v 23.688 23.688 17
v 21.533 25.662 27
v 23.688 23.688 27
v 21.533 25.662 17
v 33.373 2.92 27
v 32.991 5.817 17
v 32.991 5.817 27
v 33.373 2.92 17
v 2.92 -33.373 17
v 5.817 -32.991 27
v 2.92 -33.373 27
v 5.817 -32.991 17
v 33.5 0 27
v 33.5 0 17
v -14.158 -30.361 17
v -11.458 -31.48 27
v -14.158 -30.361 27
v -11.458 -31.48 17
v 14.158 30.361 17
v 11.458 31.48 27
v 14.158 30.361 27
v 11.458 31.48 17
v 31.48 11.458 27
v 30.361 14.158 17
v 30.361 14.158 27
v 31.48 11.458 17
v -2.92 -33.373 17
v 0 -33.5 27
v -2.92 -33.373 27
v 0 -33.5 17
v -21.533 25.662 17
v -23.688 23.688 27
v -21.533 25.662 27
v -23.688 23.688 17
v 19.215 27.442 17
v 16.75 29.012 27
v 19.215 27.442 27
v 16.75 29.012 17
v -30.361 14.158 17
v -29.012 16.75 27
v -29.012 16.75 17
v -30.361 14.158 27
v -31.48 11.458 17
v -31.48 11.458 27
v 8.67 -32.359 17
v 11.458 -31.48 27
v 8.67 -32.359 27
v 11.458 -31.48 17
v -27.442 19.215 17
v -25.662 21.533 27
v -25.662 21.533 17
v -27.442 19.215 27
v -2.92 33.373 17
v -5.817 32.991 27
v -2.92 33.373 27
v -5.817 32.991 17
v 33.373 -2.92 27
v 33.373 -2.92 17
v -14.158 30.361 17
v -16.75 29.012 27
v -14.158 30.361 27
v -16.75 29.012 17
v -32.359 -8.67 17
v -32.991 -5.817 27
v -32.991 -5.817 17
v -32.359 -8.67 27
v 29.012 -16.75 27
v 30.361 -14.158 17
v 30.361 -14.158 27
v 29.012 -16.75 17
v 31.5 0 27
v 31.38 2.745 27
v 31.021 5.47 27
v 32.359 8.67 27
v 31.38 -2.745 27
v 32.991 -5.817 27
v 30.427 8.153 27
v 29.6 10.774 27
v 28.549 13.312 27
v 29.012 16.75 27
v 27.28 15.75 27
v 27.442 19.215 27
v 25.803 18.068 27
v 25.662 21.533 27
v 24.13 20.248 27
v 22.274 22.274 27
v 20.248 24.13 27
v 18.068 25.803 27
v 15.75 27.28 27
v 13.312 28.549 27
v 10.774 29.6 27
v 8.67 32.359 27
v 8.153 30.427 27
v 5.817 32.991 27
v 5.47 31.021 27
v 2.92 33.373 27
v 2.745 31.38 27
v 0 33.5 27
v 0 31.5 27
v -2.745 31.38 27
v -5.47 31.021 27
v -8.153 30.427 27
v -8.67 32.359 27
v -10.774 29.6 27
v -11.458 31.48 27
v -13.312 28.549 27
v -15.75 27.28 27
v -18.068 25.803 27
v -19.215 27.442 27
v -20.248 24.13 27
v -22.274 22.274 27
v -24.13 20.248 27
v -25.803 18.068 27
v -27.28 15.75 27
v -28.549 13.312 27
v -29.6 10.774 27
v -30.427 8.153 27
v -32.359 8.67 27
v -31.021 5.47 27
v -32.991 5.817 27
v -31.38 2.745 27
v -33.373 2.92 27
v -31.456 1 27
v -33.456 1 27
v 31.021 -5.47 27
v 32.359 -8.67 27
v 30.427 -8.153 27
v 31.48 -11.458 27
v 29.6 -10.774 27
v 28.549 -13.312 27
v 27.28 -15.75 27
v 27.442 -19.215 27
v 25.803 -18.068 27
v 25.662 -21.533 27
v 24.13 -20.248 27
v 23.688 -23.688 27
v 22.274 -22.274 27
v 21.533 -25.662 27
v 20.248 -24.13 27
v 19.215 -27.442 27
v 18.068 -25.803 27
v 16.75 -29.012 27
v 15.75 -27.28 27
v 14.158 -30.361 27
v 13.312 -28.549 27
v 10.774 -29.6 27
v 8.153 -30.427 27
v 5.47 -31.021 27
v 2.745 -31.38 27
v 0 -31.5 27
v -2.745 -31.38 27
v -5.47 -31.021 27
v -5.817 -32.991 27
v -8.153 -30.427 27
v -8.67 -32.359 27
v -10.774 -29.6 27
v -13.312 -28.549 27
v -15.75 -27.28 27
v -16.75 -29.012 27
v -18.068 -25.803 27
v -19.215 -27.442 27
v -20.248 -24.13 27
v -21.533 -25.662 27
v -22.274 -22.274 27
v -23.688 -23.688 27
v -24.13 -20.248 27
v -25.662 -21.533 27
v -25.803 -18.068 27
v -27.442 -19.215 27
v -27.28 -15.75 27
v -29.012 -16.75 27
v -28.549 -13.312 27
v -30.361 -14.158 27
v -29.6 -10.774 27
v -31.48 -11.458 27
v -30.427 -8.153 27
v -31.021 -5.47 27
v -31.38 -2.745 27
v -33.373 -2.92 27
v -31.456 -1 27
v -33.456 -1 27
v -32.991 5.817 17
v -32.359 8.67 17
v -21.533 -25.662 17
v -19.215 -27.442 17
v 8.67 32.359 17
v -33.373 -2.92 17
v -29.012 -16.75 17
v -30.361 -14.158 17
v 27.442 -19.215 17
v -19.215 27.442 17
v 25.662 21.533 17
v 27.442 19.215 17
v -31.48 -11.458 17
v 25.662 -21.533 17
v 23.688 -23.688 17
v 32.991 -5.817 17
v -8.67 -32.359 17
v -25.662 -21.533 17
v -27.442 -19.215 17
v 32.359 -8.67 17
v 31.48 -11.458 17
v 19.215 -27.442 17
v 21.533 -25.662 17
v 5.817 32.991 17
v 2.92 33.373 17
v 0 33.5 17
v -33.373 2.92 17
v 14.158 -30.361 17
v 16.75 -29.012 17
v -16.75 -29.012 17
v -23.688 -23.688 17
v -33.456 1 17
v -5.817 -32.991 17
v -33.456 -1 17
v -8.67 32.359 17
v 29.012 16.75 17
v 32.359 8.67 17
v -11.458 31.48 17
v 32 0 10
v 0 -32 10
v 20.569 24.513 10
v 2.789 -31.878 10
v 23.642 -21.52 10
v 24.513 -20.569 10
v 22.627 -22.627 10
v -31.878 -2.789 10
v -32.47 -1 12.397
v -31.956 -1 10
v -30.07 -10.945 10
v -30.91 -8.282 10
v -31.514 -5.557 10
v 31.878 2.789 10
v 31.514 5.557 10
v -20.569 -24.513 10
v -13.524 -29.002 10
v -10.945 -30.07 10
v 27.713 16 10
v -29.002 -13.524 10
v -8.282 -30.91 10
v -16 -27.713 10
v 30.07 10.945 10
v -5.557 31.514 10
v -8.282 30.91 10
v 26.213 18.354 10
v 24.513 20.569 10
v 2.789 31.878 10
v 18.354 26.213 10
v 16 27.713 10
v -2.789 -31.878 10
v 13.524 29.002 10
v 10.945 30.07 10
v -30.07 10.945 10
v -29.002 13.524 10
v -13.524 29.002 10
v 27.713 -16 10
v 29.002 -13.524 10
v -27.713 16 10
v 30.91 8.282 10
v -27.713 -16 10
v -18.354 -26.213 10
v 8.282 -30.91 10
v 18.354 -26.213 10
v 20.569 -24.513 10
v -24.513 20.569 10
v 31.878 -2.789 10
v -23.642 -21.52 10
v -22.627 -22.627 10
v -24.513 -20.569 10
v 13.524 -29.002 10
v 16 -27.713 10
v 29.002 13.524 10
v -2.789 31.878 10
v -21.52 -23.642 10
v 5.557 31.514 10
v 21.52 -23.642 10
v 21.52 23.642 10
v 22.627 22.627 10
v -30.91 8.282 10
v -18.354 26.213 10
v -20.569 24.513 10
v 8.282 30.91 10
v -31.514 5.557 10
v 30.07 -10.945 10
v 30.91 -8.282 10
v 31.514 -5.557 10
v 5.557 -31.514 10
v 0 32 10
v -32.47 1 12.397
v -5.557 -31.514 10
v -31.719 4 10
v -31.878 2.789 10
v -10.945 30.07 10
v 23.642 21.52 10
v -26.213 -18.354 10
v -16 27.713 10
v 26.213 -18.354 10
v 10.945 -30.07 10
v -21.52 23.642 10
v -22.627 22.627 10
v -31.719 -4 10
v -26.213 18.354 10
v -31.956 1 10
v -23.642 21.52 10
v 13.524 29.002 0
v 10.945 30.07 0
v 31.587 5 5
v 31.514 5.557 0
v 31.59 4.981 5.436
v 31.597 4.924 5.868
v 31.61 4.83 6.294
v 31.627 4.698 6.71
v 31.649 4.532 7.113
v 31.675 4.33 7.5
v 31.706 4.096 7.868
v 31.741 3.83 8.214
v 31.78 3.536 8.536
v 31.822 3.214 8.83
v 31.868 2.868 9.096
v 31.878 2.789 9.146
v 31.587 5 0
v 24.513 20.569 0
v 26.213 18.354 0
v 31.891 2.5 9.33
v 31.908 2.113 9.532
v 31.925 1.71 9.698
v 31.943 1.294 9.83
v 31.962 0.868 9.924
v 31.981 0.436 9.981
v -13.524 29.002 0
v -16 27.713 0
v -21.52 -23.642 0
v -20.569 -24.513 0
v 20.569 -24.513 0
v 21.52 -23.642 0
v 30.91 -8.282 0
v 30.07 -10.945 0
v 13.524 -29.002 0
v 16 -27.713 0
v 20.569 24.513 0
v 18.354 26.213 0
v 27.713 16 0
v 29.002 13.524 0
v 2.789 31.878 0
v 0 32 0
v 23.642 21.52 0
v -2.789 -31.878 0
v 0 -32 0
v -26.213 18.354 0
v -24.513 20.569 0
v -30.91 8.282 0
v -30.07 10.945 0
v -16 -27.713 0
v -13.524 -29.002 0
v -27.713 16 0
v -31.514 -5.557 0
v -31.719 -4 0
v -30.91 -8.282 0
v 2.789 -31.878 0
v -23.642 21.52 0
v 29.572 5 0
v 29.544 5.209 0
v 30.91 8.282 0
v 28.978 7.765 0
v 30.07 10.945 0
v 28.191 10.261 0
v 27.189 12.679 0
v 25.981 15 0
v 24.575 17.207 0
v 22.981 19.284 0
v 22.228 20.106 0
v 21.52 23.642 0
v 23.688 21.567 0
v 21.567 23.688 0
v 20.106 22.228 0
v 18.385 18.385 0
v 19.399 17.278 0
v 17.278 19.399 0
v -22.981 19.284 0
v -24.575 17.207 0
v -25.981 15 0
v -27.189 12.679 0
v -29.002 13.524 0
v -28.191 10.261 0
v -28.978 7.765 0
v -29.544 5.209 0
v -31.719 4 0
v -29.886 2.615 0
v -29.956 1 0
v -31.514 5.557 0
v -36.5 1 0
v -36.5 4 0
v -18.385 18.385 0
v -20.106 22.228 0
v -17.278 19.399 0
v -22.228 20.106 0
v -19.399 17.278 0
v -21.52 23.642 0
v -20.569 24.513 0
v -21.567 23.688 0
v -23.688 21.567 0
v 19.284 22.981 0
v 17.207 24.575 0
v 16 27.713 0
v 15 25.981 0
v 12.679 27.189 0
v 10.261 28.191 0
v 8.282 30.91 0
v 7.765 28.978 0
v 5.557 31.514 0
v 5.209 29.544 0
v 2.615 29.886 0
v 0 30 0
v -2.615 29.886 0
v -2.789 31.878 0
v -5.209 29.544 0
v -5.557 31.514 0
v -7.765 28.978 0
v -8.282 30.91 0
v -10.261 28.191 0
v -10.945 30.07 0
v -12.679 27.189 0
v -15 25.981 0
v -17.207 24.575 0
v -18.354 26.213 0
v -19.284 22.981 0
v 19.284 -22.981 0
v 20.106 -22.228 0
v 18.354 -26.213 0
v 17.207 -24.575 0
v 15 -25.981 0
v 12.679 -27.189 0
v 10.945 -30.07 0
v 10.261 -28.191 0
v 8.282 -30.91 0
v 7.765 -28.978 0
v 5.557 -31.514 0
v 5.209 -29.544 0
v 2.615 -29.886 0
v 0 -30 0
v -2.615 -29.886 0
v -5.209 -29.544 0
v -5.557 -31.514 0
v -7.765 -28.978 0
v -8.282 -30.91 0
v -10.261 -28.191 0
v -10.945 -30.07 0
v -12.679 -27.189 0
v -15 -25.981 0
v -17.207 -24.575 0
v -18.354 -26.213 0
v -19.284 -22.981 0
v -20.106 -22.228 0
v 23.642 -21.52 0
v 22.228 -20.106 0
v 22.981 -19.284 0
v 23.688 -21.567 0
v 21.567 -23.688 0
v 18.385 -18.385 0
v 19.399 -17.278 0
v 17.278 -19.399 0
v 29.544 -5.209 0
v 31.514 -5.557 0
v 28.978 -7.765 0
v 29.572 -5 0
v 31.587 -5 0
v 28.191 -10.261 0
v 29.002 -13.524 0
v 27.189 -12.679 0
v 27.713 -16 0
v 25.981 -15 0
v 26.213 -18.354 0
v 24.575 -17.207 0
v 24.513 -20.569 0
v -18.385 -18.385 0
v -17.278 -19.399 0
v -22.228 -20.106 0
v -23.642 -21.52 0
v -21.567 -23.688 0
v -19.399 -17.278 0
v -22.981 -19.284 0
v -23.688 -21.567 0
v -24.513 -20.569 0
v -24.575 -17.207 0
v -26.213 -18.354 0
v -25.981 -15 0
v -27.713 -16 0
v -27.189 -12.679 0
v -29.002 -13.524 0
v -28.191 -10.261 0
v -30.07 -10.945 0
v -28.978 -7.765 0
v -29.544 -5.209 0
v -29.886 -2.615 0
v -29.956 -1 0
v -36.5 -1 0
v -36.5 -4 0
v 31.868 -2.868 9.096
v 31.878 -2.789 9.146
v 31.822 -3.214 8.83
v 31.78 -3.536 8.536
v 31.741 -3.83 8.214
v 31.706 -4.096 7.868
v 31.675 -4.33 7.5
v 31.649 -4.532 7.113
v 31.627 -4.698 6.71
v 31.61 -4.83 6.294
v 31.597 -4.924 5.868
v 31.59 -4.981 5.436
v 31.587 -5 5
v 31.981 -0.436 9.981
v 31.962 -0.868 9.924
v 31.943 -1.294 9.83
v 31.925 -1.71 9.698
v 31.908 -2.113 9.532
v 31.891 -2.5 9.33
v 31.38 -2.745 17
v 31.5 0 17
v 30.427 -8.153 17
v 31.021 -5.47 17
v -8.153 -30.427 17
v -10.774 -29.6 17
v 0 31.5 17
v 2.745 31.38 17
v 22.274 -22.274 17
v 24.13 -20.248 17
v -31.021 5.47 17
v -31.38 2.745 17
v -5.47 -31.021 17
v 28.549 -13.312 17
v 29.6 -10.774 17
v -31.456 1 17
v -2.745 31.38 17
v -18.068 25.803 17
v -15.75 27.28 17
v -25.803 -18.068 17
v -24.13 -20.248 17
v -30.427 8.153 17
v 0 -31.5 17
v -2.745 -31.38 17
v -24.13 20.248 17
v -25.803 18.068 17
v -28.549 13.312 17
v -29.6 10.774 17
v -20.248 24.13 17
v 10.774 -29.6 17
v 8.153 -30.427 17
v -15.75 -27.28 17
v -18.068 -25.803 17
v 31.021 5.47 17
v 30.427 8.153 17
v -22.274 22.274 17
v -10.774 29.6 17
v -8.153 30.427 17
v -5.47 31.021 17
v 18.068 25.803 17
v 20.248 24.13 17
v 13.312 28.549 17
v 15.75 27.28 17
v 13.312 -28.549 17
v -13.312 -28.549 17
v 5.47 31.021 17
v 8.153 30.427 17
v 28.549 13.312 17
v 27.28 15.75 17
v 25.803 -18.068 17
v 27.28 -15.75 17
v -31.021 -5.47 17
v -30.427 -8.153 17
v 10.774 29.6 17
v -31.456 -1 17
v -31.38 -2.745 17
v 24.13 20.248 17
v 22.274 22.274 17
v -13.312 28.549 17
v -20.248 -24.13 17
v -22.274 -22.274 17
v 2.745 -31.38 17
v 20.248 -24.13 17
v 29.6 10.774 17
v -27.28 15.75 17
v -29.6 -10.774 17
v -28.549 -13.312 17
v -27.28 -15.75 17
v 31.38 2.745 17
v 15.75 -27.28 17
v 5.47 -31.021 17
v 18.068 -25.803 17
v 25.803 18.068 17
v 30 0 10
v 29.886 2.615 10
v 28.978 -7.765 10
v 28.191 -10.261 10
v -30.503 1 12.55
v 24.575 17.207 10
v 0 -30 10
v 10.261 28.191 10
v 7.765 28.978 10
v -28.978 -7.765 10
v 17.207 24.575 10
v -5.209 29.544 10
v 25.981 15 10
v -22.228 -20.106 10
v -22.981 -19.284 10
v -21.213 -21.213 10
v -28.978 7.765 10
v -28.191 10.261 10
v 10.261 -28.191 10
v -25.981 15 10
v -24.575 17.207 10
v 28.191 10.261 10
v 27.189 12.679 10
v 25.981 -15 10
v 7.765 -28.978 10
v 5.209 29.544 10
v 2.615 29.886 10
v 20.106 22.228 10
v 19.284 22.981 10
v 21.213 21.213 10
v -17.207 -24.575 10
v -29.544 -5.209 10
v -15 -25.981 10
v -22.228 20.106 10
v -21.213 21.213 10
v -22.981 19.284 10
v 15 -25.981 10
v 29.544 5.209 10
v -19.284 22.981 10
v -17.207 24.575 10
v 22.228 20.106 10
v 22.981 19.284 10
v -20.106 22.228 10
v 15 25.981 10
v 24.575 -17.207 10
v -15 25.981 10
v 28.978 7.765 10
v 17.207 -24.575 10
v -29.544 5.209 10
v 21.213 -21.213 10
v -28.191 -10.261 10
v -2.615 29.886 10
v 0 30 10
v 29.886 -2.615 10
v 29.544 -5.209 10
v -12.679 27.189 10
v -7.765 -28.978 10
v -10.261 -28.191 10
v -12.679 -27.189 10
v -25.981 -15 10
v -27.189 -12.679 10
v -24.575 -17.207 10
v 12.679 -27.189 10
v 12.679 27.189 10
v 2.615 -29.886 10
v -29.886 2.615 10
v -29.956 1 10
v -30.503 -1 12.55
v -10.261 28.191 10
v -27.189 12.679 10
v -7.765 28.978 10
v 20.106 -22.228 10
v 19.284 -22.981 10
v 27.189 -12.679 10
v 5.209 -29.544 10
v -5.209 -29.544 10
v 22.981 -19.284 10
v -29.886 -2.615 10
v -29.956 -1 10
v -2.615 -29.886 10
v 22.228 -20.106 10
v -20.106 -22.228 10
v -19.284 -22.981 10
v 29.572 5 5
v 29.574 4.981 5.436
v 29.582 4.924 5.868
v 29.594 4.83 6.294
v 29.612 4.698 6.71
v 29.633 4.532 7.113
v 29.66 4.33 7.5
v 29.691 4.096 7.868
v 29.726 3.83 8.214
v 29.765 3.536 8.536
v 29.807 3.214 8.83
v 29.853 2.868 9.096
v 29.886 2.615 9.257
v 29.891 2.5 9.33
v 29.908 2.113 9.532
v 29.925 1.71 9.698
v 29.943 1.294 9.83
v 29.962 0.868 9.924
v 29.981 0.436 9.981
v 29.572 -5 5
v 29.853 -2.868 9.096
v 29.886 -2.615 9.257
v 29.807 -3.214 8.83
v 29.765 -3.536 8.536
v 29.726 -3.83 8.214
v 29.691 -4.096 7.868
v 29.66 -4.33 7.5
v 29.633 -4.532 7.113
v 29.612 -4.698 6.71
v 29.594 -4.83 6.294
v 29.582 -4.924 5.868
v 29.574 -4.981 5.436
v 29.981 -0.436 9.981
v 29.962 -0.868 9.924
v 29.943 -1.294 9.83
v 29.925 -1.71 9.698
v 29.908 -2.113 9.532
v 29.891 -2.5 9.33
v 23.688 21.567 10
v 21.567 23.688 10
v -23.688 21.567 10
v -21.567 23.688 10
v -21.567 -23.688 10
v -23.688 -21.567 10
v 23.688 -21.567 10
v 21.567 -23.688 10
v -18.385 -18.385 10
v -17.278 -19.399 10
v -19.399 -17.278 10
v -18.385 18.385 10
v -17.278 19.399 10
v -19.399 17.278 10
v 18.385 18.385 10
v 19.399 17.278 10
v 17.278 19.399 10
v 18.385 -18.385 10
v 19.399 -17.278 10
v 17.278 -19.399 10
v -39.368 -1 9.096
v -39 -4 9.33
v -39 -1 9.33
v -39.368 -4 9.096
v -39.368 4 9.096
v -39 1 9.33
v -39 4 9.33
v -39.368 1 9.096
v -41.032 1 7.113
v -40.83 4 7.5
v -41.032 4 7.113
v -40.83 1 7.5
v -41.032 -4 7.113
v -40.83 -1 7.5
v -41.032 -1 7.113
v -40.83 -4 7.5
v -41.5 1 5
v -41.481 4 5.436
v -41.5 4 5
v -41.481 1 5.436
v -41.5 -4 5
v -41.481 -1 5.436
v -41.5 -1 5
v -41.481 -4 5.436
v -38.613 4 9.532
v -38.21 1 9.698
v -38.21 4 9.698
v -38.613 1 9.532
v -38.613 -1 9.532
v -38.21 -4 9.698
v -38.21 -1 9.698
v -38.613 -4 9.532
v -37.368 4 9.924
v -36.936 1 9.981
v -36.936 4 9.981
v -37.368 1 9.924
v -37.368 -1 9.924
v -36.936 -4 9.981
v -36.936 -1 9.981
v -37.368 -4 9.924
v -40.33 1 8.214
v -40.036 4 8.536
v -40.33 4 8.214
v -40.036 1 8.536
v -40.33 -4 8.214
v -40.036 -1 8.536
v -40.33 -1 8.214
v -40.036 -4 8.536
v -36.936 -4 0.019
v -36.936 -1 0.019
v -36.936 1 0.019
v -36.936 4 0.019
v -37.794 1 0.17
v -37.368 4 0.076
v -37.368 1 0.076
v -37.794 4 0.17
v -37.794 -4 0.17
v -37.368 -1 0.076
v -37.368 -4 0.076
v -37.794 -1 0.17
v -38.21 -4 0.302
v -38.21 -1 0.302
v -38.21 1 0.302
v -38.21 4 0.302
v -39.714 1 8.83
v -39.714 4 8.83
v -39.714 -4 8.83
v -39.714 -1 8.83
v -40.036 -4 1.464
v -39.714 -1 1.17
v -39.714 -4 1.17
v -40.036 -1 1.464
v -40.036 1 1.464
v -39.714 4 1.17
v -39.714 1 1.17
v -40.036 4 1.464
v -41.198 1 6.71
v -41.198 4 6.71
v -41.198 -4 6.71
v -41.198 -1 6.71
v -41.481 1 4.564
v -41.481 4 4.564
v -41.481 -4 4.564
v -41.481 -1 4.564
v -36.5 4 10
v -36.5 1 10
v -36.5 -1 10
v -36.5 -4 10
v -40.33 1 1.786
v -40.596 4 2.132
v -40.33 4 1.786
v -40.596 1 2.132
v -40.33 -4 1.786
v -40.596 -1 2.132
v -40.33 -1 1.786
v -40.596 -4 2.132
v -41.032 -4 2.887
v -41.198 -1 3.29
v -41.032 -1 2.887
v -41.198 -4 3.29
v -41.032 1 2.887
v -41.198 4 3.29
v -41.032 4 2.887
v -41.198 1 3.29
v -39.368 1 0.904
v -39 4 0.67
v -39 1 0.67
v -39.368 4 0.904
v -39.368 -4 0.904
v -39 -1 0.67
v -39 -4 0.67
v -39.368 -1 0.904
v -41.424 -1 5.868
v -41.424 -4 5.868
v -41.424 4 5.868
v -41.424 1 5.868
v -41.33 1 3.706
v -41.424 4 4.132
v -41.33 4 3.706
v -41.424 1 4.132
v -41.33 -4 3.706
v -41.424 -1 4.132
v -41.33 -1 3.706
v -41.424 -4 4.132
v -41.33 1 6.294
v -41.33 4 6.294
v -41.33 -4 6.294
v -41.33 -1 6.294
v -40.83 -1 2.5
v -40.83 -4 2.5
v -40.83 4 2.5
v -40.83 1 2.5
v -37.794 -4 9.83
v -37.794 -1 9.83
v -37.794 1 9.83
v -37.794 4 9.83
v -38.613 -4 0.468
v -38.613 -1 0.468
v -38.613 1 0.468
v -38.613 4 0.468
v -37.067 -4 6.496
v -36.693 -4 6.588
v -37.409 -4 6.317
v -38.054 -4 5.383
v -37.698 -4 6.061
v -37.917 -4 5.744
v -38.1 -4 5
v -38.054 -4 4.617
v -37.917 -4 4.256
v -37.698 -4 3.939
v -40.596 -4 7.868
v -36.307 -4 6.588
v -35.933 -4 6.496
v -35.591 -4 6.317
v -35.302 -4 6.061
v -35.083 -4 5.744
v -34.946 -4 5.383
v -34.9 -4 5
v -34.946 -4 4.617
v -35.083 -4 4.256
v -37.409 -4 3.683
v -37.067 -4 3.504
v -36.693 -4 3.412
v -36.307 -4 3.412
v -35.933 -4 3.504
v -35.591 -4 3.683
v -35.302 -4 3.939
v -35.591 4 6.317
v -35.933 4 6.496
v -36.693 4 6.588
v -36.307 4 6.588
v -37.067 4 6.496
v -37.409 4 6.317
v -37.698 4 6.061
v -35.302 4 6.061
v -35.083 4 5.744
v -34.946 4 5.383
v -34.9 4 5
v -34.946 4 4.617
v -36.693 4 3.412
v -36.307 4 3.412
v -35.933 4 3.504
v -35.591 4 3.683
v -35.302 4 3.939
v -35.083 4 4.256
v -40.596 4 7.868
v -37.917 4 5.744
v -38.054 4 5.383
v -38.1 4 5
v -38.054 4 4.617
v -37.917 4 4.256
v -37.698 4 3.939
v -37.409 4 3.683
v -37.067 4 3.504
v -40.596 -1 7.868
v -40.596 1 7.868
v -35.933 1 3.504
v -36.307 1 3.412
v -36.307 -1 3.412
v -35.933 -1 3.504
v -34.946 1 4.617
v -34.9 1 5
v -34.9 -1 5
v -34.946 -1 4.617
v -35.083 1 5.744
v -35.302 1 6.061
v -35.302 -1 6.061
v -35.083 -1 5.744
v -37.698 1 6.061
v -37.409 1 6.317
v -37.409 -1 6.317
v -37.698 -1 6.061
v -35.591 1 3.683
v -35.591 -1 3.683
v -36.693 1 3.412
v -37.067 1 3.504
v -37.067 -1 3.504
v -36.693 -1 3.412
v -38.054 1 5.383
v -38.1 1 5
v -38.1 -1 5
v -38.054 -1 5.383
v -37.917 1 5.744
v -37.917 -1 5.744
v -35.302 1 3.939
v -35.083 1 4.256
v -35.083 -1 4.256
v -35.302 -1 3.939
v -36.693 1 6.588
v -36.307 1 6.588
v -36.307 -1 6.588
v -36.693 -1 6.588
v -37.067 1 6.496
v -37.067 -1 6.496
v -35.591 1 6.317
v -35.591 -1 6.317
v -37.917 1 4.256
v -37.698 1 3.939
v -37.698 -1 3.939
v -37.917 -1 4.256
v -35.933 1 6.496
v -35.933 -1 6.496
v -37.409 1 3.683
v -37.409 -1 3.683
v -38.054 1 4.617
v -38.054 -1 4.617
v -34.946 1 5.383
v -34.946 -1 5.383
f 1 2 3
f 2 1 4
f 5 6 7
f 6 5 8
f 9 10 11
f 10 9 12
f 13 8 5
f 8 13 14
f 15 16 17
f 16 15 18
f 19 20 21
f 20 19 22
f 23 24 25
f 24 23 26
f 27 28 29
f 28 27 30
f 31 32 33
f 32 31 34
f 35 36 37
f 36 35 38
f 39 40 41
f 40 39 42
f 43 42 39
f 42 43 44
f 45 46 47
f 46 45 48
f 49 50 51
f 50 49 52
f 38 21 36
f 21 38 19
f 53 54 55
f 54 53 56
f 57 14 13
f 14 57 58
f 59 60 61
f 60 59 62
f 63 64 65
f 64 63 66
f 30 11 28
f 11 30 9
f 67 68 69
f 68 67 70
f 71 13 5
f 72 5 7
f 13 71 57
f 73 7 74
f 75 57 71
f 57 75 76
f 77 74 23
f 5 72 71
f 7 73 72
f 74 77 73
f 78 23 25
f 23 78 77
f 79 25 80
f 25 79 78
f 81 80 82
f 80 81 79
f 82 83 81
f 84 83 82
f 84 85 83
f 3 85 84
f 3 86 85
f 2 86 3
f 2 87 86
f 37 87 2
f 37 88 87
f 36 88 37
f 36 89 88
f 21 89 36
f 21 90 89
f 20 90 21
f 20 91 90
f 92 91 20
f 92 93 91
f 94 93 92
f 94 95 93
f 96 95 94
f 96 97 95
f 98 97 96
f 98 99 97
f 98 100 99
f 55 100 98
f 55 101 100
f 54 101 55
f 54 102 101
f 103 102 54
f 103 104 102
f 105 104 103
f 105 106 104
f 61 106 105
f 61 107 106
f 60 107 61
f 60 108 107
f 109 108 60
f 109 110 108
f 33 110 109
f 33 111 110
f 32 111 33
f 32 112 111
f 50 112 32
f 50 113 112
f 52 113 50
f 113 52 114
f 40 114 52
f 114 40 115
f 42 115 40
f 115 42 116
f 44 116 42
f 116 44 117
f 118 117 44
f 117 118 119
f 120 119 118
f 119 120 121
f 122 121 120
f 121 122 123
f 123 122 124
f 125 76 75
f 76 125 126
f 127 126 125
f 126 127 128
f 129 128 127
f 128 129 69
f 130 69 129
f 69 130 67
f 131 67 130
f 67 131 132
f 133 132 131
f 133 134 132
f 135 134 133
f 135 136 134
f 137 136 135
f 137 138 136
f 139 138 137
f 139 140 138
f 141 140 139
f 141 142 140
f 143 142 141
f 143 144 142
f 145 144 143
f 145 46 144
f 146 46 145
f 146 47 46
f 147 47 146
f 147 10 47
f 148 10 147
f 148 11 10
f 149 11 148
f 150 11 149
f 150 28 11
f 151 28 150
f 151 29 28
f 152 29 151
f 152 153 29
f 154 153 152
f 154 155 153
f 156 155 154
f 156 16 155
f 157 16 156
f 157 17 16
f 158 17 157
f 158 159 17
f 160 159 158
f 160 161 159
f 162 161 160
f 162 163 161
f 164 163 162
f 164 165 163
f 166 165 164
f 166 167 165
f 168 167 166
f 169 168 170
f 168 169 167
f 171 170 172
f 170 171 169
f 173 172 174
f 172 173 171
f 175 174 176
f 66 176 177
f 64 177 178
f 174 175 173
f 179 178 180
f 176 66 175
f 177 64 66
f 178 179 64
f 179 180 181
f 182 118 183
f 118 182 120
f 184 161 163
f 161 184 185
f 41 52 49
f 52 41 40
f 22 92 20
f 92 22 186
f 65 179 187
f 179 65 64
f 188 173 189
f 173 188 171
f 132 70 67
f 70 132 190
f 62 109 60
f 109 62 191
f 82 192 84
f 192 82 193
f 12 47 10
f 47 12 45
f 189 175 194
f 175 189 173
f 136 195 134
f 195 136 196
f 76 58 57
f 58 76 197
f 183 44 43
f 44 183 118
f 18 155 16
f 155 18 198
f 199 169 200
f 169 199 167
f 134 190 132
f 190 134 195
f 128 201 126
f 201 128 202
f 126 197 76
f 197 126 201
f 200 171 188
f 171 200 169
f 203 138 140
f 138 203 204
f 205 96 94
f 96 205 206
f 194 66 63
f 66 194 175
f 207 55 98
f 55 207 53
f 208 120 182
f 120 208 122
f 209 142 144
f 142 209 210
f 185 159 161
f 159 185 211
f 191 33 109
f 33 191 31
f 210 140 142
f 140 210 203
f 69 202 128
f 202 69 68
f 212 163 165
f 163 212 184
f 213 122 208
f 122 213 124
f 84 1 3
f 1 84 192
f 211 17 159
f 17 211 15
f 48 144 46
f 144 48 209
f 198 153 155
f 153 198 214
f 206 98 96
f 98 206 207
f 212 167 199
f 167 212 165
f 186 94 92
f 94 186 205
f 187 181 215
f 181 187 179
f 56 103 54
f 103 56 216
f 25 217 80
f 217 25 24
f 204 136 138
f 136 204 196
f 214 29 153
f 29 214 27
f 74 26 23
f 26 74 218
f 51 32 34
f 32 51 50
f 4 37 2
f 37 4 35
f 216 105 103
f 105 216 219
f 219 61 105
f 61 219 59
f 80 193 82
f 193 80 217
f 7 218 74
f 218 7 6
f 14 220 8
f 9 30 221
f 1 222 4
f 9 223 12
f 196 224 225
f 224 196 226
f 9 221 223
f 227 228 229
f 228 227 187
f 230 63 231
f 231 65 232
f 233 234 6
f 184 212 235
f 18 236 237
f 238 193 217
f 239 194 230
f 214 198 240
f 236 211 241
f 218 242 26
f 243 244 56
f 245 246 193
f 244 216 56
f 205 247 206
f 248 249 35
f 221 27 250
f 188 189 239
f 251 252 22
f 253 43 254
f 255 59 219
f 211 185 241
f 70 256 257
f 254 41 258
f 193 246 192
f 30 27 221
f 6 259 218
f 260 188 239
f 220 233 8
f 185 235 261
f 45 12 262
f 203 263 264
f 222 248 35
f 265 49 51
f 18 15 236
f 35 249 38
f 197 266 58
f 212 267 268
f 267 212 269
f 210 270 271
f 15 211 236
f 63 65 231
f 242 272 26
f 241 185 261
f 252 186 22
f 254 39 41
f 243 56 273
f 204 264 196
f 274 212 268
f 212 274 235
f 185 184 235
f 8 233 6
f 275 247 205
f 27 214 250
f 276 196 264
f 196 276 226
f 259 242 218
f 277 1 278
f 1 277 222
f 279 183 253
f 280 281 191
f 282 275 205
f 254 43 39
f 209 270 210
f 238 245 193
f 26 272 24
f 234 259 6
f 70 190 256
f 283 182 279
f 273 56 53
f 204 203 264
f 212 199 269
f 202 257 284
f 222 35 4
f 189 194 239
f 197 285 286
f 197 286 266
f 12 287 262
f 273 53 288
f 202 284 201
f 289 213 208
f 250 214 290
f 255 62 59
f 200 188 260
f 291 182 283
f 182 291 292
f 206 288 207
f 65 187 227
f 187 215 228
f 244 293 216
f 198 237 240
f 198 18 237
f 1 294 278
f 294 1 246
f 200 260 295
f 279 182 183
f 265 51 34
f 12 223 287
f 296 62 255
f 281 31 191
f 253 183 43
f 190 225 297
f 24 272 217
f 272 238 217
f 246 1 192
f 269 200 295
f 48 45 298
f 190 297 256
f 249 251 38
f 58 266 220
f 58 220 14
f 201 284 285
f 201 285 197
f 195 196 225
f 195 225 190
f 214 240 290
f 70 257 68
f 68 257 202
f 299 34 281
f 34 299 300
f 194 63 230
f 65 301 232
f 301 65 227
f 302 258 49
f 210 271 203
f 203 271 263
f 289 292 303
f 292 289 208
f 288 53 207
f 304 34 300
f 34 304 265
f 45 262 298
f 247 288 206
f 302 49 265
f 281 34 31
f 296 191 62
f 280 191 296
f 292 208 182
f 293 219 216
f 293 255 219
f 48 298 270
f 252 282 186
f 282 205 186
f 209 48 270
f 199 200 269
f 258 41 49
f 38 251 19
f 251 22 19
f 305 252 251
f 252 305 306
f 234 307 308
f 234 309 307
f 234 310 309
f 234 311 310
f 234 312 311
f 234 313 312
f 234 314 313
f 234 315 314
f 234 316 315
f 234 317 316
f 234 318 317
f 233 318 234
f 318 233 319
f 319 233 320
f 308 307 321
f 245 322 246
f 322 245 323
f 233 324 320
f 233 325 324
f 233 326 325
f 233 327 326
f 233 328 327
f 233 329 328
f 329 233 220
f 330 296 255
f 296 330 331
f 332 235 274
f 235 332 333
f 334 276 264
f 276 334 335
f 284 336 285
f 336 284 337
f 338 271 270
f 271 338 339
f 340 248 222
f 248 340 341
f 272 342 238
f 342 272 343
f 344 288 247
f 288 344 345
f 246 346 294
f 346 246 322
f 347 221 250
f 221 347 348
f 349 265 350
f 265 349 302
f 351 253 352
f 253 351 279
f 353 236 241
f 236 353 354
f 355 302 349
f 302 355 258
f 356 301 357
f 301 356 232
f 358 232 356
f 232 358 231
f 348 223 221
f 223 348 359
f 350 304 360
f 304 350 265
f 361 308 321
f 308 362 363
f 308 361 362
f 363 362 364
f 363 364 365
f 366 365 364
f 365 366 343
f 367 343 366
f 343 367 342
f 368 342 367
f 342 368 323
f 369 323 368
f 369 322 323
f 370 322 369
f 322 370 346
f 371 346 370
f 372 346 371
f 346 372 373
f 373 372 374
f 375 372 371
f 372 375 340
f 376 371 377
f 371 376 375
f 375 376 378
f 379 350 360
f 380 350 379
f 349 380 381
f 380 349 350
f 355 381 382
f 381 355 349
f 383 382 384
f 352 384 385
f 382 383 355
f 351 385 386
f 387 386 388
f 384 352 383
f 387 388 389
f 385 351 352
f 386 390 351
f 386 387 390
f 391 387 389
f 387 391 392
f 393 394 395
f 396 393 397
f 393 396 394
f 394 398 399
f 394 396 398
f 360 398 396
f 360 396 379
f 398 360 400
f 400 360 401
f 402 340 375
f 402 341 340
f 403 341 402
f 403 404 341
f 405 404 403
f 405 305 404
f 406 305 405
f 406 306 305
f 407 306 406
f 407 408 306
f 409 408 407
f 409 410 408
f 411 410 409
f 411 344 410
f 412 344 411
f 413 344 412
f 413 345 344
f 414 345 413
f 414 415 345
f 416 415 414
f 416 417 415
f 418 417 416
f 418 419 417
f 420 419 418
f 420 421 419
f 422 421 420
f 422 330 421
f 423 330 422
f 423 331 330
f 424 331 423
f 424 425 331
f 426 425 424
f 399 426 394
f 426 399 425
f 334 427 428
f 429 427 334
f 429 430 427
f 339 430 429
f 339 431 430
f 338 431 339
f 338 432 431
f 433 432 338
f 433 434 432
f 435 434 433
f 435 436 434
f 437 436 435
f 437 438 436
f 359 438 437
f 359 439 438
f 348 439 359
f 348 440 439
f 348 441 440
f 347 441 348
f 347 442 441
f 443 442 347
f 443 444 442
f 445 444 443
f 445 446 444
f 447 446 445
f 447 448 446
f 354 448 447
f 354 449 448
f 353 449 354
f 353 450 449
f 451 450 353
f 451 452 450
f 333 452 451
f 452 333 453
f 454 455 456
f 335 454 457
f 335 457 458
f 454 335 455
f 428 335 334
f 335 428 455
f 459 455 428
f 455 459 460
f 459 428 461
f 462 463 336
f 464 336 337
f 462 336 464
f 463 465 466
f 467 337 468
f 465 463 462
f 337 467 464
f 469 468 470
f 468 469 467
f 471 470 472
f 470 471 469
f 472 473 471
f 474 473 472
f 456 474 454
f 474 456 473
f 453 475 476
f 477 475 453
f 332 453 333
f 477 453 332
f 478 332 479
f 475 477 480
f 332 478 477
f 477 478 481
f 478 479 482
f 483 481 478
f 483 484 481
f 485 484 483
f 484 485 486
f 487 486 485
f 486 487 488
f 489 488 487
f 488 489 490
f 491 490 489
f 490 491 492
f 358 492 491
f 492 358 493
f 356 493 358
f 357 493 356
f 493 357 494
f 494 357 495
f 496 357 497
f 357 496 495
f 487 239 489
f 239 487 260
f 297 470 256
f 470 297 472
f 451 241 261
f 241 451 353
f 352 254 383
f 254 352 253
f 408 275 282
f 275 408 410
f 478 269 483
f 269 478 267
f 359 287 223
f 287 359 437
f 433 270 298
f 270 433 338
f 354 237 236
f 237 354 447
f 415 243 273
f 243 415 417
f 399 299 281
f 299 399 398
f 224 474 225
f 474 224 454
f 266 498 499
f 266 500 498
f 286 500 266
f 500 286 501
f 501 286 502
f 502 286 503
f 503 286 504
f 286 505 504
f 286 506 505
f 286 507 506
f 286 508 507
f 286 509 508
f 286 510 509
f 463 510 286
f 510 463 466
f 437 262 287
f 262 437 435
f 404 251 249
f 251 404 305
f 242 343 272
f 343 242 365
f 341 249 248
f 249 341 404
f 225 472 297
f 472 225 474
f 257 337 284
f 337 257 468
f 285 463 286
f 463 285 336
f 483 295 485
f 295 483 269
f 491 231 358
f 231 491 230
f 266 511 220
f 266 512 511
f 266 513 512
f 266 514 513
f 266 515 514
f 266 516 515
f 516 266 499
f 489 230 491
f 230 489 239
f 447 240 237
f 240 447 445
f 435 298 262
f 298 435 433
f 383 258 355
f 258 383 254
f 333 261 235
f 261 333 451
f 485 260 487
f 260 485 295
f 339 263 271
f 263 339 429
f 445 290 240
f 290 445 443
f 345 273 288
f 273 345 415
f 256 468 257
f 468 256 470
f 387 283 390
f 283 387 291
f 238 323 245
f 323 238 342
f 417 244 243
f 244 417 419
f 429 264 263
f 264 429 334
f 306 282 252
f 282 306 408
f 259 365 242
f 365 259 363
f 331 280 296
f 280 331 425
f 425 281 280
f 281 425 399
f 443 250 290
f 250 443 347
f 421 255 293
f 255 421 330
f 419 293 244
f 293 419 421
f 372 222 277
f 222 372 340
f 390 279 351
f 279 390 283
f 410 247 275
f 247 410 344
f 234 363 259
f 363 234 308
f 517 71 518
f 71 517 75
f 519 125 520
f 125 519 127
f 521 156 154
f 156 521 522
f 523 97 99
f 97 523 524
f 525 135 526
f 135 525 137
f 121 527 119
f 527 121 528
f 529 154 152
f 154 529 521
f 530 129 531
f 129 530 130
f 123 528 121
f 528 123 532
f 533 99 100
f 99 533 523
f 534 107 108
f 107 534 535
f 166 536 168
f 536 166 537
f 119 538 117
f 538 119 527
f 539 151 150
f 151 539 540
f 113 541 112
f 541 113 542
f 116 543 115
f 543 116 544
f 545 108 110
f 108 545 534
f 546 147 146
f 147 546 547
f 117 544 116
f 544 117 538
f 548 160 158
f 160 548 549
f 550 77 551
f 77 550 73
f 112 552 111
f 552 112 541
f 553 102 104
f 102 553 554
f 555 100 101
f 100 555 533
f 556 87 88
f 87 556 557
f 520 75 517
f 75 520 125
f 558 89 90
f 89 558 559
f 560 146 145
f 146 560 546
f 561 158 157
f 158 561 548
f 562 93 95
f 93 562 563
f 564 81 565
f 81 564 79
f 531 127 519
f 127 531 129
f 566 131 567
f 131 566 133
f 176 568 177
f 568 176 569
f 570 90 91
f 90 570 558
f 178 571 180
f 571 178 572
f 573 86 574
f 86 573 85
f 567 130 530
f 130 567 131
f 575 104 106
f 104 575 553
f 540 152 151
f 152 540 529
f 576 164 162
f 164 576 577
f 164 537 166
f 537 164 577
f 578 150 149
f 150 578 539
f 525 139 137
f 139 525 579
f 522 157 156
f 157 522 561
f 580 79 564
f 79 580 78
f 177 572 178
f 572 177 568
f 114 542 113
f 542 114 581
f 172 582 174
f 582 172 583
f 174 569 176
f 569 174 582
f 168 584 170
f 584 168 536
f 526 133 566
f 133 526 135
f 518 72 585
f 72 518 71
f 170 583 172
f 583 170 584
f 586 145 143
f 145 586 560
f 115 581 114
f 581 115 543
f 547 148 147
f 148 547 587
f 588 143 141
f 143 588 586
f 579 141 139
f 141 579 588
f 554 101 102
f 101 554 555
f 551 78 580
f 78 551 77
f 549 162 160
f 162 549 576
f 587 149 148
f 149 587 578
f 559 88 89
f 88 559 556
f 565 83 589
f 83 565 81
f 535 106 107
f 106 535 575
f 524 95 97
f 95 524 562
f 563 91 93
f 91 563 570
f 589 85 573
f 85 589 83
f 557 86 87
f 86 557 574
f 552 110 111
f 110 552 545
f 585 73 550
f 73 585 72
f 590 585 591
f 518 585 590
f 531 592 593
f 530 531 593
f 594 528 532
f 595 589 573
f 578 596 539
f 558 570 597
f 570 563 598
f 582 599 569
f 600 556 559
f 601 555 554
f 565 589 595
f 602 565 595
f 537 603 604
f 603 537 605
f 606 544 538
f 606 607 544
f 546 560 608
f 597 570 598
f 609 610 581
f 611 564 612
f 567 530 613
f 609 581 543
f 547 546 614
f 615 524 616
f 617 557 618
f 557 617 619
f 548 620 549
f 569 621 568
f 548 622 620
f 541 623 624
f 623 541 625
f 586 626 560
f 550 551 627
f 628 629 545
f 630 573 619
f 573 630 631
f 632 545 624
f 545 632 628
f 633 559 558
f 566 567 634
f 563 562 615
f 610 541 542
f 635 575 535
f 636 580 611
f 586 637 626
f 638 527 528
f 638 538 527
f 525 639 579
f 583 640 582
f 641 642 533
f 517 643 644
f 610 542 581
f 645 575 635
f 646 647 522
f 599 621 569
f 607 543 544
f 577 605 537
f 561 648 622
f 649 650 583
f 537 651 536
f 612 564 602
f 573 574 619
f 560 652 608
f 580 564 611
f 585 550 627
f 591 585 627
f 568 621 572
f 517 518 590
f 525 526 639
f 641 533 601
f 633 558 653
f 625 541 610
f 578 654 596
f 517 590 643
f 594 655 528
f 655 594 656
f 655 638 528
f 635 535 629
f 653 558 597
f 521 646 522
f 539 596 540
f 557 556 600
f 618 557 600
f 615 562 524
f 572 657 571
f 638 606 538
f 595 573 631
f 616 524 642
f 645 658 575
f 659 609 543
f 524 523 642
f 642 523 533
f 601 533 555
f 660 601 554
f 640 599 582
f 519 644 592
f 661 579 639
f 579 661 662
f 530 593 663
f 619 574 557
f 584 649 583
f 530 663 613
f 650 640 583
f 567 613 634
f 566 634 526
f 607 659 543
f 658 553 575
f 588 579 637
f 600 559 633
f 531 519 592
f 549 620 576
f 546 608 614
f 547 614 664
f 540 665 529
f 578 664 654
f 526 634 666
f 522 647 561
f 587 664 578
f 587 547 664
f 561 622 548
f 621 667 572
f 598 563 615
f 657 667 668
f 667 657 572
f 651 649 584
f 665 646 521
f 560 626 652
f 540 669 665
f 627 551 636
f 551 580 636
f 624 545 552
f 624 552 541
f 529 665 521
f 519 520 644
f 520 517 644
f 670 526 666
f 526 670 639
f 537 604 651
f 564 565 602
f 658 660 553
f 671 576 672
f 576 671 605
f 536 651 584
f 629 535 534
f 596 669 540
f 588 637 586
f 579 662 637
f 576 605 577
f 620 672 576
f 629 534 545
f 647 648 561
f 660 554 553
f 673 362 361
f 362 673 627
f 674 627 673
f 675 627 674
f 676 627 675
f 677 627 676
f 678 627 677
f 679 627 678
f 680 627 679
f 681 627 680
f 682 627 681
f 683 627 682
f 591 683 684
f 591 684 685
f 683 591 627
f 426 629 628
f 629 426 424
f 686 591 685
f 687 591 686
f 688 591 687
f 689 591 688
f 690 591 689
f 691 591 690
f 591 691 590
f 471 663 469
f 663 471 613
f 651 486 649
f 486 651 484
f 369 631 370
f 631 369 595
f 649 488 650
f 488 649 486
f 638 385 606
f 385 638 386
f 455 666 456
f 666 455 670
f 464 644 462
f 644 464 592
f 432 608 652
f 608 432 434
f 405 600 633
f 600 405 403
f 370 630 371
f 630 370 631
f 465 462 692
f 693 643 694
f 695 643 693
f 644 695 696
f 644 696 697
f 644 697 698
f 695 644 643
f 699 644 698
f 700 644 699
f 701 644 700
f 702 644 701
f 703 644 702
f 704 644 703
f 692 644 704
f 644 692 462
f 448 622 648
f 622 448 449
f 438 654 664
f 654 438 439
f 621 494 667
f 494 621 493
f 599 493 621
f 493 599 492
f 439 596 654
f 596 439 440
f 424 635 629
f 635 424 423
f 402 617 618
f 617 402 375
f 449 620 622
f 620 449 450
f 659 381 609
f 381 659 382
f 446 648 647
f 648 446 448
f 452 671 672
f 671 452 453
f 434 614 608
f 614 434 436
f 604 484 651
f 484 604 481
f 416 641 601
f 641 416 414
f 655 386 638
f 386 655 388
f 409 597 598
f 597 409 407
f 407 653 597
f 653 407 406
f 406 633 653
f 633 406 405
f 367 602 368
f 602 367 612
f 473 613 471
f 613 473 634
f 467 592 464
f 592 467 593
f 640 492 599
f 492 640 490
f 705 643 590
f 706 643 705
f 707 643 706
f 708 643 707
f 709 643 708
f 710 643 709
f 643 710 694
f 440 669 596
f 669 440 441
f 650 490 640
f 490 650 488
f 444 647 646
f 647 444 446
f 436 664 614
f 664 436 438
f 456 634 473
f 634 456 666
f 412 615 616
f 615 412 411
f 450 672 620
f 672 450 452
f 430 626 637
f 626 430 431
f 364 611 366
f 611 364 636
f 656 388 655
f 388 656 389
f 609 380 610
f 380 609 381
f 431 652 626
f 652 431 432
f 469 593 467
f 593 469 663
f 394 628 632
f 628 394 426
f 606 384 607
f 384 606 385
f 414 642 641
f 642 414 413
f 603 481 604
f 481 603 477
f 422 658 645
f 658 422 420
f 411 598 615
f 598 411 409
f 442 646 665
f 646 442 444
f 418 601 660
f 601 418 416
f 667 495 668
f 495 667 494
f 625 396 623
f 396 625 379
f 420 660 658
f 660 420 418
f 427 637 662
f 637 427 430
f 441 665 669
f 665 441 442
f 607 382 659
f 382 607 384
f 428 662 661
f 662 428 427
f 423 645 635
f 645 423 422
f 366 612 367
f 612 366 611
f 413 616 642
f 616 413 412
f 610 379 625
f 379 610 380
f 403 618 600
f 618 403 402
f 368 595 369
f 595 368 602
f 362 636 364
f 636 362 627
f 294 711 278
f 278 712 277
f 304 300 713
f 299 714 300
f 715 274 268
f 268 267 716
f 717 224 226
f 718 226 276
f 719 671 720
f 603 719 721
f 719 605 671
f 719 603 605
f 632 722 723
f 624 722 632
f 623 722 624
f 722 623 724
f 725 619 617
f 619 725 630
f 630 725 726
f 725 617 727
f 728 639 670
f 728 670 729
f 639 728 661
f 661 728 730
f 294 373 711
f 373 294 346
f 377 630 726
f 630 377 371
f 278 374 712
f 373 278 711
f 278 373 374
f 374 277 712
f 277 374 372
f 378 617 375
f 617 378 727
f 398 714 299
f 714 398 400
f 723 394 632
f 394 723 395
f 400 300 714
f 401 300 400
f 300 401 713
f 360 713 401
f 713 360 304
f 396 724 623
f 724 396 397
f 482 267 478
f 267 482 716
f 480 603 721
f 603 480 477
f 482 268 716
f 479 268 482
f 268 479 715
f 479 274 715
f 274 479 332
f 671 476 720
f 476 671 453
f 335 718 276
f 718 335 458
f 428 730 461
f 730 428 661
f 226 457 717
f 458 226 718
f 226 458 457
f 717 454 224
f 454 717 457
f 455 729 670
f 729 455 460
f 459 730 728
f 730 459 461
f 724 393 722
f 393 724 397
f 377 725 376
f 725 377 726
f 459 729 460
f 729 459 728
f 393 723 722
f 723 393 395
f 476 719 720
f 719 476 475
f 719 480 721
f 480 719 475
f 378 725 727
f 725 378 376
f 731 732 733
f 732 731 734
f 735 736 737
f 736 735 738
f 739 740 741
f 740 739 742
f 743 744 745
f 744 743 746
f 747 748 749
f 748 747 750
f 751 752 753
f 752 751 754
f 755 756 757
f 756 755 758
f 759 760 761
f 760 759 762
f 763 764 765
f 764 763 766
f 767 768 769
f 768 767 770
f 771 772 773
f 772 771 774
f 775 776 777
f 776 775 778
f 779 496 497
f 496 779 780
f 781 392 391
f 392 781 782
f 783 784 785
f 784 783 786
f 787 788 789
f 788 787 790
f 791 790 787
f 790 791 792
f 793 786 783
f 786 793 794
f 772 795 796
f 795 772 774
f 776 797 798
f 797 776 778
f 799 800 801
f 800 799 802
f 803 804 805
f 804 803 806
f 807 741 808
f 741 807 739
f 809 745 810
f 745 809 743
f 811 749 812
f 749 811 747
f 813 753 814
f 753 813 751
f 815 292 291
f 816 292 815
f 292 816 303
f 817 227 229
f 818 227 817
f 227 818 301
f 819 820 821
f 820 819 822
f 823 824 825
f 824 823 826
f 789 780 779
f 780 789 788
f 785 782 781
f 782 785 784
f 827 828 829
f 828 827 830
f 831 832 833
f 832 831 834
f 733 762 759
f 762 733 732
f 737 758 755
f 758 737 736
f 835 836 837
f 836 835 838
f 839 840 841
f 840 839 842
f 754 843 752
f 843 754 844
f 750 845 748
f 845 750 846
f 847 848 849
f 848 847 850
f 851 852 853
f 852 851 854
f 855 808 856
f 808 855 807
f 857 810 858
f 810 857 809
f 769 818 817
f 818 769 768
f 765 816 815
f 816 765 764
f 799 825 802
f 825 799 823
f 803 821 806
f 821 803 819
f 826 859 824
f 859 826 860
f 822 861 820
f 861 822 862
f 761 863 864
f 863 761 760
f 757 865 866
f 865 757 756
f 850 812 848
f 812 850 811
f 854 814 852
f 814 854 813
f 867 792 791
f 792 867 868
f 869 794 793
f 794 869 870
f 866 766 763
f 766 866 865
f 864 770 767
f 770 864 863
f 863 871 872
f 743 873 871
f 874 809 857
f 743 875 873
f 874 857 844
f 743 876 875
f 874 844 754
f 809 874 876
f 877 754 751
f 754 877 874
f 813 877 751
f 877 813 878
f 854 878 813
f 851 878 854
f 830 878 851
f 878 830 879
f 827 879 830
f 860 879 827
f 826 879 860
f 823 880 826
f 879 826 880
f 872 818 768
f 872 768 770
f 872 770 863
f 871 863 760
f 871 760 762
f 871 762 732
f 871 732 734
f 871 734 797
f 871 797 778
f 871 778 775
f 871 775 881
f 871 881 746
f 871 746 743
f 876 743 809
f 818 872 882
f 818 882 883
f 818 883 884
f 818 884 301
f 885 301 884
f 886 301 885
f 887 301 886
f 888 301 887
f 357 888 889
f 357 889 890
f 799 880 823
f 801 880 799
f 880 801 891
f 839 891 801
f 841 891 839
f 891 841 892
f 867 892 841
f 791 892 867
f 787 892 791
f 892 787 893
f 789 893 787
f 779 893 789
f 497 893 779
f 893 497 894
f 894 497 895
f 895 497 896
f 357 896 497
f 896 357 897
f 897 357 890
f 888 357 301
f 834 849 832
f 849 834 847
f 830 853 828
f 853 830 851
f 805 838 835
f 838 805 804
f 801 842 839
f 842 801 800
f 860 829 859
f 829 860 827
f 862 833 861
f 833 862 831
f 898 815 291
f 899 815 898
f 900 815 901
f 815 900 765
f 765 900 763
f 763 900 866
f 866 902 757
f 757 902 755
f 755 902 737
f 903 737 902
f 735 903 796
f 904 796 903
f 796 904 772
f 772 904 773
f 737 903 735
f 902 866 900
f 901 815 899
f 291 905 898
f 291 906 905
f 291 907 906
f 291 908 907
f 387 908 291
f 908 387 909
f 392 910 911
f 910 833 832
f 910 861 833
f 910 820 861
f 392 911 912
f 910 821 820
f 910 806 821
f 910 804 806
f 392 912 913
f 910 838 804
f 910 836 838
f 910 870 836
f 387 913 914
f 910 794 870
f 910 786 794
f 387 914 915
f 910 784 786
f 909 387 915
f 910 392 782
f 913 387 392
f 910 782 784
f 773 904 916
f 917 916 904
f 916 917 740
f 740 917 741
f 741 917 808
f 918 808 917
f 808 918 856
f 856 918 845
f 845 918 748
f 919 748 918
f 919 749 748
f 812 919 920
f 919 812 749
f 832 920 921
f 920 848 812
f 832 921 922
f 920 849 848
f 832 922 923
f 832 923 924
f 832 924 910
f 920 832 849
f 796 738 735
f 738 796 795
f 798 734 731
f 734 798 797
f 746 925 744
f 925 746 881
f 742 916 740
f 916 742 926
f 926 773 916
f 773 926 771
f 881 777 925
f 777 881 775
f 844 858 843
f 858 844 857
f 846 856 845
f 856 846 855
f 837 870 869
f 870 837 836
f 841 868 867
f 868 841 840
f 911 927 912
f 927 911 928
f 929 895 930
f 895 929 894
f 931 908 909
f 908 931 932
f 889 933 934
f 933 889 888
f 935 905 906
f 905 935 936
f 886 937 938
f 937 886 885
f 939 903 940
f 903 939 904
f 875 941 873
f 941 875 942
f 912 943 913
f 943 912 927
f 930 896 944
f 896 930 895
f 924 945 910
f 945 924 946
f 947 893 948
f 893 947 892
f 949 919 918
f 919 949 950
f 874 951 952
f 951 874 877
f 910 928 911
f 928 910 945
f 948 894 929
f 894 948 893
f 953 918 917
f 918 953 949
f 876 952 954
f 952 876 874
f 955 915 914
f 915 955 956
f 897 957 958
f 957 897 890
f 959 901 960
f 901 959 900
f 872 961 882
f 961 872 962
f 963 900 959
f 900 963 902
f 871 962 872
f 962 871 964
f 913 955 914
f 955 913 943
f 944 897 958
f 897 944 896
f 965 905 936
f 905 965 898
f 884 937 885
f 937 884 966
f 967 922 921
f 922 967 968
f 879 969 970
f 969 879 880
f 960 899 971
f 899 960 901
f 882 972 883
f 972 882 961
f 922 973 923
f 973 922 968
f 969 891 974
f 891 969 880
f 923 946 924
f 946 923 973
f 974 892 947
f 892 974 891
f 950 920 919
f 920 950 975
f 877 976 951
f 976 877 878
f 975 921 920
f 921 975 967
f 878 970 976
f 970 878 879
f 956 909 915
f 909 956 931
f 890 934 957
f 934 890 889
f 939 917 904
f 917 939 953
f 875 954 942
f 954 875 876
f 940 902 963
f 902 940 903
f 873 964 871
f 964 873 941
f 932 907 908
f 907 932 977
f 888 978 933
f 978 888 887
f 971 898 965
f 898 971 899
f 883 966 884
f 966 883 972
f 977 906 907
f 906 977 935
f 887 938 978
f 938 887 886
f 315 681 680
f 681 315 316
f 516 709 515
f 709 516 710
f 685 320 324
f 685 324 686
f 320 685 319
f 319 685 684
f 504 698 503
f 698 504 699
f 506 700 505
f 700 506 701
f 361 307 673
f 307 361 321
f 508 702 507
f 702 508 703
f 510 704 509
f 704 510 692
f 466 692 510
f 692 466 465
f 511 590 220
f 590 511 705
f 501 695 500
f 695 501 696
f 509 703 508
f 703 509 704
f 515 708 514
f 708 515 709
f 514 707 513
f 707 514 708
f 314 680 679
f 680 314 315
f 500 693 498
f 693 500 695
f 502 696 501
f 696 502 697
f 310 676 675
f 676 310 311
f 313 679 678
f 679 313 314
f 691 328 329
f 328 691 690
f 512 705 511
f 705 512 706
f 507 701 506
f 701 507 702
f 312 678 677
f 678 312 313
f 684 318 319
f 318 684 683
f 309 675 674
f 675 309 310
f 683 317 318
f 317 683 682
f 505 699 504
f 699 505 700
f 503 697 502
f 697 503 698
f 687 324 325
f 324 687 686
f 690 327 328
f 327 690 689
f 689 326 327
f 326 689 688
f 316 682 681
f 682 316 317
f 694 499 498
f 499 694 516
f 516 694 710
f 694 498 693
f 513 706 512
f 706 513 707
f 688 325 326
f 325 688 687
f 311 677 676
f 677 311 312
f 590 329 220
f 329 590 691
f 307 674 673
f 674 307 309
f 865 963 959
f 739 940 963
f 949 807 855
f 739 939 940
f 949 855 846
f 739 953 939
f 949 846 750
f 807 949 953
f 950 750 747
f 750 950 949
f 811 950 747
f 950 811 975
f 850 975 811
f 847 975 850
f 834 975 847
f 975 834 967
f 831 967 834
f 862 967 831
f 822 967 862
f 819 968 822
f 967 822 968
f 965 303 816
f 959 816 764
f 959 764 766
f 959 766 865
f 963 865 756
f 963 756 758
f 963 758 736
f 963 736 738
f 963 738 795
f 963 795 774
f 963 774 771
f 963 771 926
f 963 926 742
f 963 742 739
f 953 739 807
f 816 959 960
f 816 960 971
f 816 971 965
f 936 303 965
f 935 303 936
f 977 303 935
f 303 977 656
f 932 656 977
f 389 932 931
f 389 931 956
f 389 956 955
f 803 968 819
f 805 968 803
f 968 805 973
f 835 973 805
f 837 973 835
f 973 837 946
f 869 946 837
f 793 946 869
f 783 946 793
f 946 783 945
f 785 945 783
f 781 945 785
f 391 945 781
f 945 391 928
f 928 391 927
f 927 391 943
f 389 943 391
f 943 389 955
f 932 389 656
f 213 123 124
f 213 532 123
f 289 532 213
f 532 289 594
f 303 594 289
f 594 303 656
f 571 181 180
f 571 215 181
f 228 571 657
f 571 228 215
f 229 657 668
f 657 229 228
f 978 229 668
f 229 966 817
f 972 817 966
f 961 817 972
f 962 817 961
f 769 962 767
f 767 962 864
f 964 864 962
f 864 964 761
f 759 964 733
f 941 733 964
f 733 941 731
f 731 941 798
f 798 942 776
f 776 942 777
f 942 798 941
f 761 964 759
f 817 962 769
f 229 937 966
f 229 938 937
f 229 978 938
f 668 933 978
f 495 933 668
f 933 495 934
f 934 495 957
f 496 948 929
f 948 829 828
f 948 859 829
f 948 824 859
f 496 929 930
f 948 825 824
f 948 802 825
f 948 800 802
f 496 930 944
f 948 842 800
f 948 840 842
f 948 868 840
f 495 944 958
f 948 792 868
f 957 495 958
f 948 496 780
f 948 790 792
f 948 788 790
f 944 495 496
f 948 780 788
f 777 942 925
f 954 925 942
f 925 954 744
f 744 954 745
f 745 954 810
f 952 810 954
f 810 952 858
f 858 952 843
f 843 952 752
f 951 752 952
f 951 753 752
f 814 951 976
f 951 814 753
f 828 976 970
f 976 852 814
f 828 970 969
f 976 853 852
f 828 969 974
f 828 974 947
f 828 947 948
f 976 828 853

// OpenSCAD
//$fn=60;
$fa=5;
$fs=.4;

body();

module body(){
    difference(){
        union(){
            difference(){
                base_shape(wall=2);
                base_shape();
            }
            kross();
            clamp();
        }
        cable_cut();
        split_cut();
    }   
}

module clamp(){
    translate([-(63/2+5),4,5]) rotate([90,0,0]) 
    difference(){
        linear_extrude(height=8){
            circle(d=10);
            translate([2.5,0,0]) square([5,10],center=true);
        }
        translate([0,0,-1]) linear_extrude(height=10) circle(d=3.2);
    }
}

module cable_cut(){
    rotate([0,90,0]) linear_extrude(height=40){
        translate([-5,0,0]) circle(d=10);
        square([10,10],center=true);
    }
}

module split_cut(){
    translate([-35,0,-1]) linear_extrude(height=40) square([20,2],center=true);
}

module base_shape(wall=0){
    translate([0,0,17]) linear_extrude(height=10) circle(d=63+2*wall);
    translate([0,0,10]) hull(){
        translate([0,0,7]) linear_extrude(height=0.1) circle(d=63+2*wall);
        linear_extrude(height=0.1) circle(d=60+2*wall);
    }
    linear_extrude(height=10) circle(d=60+2*wall);
}

module kross(){
    difference(){
        rotate([0,0,45]) linear_extrude(height=10){
            square([64,3],center=true);
            square([3,64],center=true);
        }
        translate([0,0,-1]) linear_extrude(height=12) circle(d=52);
    }
}
